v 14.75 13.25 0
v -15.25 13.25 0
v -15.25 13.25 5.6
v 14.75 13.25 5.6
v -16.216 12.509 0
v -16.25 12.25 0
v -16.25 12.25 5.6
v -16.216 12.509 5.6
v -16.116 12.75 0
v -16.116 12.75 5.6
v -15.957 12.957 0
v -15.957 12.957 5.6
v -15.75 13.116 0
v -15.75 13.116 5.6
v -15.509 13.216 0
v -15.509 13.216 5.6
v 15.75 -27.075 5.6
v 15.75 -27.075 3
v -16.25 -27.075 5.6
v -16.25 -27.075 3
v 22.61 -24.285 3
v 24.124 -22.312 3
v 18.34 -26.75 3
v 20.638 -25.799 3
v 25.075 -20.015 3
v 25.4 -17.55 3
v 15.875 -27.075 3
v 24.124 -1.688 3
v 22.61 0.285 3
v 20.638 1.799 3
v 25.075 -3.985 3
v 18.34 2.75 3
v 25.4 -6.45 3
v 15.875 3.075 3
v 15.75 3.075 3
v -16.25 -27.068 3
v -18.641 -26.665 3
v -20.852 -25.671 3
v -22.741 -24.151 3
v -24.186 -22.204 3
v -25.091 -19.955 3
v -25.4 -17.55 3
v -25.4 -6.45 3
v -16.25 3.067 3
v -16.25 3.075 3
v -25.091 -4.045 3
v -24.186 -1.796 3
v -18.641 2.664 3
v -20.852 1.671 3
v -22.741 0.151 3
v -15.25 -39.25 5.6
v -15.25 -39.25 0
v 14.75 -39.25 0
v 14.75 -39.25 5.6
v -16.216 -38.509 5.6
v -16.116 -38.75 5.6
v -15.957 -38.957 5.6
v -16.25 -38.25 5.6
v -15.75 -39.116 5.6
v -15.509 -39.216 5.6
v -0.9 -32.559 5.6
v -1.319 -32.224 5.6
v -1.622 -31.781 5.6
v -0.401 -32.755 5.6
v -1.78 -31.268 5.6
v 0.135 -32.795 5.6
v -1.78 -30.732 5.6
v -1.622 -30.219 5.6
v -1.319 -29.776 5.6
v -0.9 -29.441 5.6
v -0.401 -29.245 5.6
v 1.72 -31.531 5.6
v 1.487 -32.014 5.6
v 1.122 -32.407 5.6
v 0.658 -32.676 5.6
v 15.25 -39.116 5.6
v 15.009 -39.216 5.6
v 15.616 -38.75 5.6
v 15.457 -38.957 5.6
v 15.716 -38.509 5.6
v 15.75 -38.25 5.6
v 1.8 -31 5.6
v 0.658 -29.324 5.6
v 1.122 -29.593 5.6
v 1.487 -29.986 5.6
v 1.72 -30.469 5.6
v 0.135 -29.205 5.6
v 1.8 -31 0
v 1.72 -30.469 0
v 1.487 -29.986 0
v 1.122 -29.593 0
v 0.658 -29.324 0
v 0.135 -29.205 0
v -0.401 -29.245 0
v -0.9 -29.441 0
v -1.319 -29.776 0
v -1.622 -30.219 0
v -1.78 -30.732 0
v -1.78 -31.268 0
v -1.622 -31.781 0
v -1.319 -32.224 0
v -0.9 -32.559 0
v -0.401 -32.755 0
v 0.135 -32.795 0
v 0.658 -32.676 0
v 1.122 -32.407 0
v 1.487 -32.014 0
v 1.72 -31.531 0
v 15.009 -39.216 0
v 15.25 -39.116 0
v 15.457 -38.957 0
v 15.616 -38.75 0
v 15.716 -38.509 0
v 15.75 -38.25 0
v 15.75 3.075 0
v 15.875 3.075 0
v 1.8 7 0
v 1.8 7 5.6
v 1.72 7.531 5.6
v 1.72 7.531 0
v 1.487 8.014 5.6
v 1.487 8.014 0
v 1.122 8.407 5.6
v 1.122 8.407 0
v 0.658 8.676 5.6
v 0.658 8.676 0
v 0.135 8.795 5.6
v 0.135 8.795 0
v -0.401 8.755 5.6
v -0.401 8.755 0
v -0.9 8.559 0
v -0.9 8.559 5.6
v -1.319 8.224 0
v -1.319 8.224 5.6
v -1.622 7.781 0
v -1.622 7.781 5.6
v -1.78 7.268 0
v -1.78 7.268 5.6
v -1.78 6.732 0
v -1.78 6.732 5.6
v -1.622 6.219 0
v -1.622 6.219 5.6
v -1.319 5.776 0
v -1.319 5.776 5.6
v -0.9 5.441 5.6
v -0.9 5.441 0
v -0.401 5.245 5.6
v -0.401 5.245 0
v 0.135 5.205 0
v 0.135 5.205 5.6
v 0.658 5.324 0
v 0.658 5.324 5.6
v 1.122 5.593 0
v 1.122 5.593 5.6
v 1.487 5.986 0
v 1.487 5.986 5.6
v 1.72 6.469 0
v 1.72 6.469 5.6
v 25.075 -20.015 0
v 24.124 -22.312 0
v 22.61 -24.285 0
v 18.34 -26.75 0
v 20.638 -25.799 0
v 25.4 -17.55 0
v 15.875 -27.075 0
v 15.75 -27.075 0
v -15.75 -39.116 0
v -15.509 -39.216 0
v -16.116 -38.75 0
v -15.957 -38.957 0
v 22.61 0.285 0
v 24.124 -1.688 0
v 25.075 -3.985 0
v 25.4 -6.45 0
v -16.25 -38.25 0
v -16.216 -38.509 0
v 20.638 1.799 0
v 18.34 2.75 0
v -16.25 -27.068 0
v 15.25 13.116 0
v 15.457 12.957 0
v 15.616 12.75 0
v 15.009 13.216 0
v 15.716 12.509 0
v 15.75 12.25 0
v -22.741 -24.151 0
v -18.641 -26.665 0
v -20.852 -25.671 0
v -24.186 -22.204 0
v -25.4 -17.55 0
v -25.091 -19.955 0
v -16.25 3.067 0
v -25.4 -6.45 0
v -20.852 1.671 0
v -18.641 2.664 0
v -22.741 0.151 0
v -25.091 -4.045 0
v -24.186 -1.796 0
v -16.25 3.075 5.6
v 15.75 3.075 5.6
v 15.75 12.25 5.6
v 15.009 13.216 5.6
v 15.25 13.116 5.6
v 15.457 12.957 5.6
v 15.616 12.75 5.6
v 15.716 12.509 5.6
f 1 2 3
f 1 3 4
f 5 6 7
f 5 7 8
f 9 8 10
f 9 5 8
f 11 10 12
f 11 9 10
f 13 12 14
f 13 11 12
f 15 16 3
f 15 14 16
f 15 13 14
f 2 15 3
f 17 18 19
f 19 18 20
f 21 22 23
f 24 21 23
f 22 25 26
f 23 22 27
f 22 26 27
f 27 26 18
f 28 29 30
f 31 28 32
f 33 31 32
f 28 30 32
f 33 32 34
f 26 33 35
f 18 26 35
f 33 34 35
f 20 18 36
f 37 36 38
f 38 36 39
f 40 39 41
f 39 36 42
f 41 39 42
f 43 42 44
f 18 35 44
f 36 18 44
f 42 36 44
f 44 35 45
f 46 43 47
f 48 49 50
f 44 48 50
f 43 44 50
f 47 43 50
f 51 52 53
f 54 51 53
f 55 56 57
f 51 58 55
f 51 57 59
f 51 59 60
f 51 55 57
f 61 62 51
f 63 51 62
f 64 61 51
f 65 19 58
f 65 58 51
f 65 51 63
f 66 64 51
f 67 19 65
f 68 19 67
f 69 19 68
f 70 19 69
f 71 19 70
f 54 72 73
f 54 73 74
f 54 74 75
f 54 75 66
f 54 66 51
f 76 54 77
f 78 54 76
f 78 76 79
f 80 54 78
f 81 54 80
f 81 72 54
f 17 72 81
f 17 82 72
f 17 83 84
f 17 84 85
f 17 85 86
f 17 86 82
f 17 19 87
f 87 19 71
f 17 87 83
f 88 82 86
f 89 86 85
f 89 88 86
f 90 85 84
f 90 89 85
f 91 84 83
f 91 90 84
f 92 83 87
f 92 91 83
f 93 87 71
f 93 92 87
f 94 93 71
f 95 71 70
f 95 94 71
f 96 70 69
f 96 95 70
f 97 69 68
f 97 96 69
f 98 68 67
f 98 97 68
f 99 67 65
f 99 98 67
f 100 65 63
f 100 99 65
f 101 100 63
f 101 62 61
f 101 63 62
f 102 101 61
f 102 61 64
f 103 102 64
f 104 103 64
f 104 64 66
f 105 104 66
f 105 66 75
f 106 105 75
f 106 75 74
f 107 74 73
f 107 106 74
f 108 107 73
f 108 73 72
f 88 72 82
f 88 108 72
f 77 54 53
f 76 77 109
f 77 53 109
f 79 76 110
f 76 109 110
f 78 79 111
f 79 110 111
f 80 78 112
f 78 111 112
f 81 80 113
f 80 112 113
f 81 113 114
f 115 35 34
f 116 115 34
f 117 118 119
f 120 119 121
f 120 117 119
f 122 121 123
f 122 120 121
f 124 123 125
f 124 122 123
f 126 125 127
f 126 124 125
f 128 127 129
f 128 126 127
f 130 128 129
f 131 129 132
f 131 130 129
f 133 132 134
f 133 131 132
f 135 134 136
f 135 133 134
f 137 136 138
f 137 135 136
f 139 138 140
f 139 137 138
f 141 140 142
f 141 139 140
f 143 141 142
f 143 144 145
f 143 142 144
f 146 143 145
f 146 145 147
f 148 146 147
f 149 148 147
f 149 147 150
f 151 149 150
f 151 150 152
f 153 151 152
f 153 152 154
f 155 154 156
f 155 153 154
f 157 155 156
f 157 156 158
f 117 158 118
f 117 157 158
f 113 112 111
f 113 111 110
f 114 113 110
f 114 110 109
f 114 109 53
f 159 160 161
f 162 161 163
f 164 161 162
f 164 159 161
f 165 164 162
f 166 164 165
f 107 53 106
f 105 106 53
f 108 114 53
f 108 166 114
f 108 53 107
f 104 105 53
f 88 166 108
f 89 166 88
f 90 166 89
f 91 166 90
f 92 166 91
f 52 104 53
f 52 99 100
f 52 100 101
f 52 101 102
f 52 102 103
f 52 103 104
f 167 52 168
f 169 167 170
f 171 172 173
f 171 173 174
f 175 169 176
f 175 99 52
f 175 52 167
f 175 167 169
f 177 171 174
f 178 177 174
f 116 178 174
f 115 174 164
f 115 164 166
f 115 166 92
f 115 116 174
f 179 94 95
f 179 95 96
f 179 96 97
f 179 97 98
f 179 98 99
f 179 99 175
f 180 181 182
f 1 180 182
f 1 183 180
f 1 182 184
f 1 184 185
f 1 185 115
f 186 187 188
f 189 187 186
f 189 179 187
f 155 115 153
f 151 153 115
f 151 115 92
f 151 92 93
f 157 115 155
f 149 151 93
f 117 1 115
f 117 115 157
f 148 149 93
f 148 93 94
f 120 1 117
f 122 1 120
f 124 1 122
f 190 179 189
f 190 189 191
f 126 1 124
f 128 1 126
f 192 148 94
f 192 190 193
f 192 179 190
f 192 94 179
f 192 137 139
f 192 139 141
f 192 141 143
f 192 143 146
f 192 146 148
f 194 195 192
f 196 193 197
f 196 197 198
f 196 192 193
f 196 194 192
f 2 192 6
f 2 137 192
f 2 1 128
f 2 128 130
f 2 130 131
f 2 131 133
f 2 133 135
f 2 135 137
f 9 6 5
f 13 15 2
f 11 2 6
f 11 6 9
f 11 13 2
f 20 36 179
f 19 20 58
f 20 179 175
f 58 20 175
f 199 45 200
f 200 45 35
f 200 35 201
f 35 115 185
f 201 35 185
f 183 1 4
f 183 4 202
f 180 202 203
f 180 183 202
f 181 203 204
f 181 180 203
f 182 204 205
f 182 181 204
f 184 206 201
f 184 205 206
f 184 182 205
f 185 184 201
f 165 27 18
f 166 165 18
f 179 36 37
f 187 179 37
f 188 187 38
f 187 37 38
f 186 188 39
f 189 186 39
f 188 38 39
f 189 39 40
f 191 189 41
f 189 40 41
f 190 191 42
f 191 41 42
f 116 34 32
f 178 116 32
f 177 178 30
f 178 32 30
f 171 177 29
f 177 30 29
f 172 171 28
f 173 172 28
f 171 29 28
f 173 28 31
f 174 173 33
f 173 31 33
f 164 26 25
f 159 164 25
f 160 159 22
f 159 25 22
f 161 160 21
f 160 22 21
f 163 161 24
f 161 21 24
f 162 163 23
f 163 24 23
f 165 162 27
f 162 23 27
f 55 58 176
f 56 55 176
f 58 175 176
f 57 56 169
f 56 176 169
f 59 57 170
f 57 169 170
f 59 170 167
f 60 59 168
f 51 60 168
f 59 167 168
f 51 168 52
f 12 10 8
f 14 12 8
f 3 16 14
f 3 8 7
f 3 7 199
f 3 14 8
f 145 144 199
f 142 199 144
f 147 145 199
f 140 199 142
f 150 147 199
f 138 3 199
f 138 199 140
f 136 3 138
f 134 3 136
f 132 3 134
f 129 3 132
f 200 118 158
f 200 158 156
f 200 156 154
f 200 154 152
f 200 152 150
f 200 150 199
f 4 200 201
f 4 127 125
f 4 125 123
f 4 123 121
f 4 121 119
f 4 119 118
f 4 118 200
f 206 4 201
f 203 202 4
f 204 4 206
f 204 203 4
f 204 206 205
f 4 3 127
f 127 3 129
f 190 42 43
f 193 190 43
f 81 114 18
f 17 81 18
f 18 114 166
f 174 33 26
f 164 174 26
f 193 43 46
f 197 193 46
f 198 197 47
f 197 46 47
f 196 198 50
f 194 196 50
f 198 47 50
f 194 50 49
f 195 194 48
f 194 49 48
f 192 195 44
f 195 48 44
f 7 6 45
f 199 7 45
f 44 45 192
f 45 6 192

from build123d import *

# Parameters (mm, degrees)
BOSS_EXTRUDE1_DEPTH = 3
BOSS_EXTRUDE2_DEPTH = 2.6
BOSS_EXTRUDE3_DEPTH = 3
SKETCH8_R           = 1.8
CUT_EXTRUDE2_DEPTH  = 8


with BuildPart() as part:
    # Sketch1 → Boss-Extrude1 (new body)
    with BuildSketch(Plane.XY):
        with BuildLine():
            Line((-15.250000001, 13.250000001), (14.75, 13.250000001))
            ThreePointArc((14.75, 13.250000001), (15.457106781, 12.957106782), (15.75, 12.250000001))
            Line((15.75, 12.250000001), (15.75, -38.249999999))
            ThreePointArc((15.75, -38.249999999), (15.457106781, -38.95710678), (14.75, -39.249999999))
            Line((14.75, -39.249999999), (-15.250000001, -39.249999999))
            ThreePointArc((-15.250000001, -39.249999999), (-15.957106782, -38.95710678), (-16.250000001, -38.249999999))
            Line((-16.250000001, -38.249999999), (-16.250000001, 12.250000001))
            ThreePointArc((-16.250000001, 12.250000001), (-15.957106782, 12.957106782), (-15.250000001, 13.250000001))
        make_face()
    extrude(amount=BOSS_EXTRUDE1_DEPTH)

    # Sketch2 → Boss-Extrude2 (add)
    with BuildSketch(Plane.XY.offset(3)):
        with BuildLine():
            Line((15.75, -38.249999999), (15.75, -27.074999999))
            Line((15.75, -27.074999999), (-16.250000001, -27.074999999))
            Line((-16.250000001, -27.074999999), (-16.250000001, -38.249999999))
            ThreePointArc((-16.250000001, -38.249999999), (-15.957106782, -38.95710678), (-15.250000001, -39.249999999))
            Line((-15.250000001, -39.249999999), (14.75, -39.249999999))
            ThreePointArc((14.75, -39.249999999), (15.457106781, -38.95710678), (15.75, -38.249999999))
        make_face()
        with BuildLine():
            Line((14.75, 13.250000001), (-15.250000001, 13.250000001))
            ThreePointArc((-15.250000001, 13.250000001), (-15.957106782, 12.957106782), (-16.250000001, 12.250000001))
            Line((-16.250000001, 12.250000001), (-16.250000001, 3.075000001))
            Line((-16.250000001, 3.075000001), (15.75, 3.075000001))
            Line((15.75, 3.075000001), (15.75, 12.250000001))
            ThreePointArc((15.75, 12.250000001), (15.457106781, 12.957106782), (14.75, 13.250000001))
        make_face()
    extrude(amount=BOSS_EXTRUDE2_DEPTH)

    # Sketch7 → Boss-Extrude3 (add)
    with BuildSketch(Plane.XY.offset(3)):
        with BuildLine():
            Line((-14.732, 3.074800001), (14.732, 3.074800001))
            Line((14.732, 3.074800001), (15.875, 3.074800001))
            ThreePointArc((15.875, 3.074800001), (22.610192091, 0.284992092), (25.4, -6.450199999))
            Line((25.4, -6.450199999), (25.4, -17.549999999))
            ThreePointArc((25.4, -17.549999999), (22.610192091, -24.28519209), (15.875, -27.074999999))
            Line((15.875, -27.074999999), (14.732, -27.074999999))
            Line((14.732, -27.074999999), (-14.732, -27.074999999))
            Line((-14.732, -27.074999999), (-15.875, -27.074999999))
            ThreePointArc((-15.875, -27.074999999), (-22.610192091, -24.28519209), (-25.4, -17.549999999))
            Line((-25.4, -17.549999999), (-25.4, -6.450199999))
            ThreePointArc((-25.4, -6.450199999), (-22.610192091, 0.284992092), (-15.875, 3.074800001))
            Line((-15.875, 3.074800001), (-14.732, 3.074800001))
        make_face()
    extrude(amount=-BOSS_EXTRUDE3_DEPTH)

    # Sketch8 → Cut-Extrude2 (cut)
    with BuildSketch(Plane.XY):
        with Locations((0, 7)):
            Circle(SKETCH8_R)
        with Locations((0, -31)):
            Circle(SKETCH8_R)
    extrude(amount=CUT_EXTRUDE2_DEPTH, mode=Mode.SUBTRACT)


solid = part.part
